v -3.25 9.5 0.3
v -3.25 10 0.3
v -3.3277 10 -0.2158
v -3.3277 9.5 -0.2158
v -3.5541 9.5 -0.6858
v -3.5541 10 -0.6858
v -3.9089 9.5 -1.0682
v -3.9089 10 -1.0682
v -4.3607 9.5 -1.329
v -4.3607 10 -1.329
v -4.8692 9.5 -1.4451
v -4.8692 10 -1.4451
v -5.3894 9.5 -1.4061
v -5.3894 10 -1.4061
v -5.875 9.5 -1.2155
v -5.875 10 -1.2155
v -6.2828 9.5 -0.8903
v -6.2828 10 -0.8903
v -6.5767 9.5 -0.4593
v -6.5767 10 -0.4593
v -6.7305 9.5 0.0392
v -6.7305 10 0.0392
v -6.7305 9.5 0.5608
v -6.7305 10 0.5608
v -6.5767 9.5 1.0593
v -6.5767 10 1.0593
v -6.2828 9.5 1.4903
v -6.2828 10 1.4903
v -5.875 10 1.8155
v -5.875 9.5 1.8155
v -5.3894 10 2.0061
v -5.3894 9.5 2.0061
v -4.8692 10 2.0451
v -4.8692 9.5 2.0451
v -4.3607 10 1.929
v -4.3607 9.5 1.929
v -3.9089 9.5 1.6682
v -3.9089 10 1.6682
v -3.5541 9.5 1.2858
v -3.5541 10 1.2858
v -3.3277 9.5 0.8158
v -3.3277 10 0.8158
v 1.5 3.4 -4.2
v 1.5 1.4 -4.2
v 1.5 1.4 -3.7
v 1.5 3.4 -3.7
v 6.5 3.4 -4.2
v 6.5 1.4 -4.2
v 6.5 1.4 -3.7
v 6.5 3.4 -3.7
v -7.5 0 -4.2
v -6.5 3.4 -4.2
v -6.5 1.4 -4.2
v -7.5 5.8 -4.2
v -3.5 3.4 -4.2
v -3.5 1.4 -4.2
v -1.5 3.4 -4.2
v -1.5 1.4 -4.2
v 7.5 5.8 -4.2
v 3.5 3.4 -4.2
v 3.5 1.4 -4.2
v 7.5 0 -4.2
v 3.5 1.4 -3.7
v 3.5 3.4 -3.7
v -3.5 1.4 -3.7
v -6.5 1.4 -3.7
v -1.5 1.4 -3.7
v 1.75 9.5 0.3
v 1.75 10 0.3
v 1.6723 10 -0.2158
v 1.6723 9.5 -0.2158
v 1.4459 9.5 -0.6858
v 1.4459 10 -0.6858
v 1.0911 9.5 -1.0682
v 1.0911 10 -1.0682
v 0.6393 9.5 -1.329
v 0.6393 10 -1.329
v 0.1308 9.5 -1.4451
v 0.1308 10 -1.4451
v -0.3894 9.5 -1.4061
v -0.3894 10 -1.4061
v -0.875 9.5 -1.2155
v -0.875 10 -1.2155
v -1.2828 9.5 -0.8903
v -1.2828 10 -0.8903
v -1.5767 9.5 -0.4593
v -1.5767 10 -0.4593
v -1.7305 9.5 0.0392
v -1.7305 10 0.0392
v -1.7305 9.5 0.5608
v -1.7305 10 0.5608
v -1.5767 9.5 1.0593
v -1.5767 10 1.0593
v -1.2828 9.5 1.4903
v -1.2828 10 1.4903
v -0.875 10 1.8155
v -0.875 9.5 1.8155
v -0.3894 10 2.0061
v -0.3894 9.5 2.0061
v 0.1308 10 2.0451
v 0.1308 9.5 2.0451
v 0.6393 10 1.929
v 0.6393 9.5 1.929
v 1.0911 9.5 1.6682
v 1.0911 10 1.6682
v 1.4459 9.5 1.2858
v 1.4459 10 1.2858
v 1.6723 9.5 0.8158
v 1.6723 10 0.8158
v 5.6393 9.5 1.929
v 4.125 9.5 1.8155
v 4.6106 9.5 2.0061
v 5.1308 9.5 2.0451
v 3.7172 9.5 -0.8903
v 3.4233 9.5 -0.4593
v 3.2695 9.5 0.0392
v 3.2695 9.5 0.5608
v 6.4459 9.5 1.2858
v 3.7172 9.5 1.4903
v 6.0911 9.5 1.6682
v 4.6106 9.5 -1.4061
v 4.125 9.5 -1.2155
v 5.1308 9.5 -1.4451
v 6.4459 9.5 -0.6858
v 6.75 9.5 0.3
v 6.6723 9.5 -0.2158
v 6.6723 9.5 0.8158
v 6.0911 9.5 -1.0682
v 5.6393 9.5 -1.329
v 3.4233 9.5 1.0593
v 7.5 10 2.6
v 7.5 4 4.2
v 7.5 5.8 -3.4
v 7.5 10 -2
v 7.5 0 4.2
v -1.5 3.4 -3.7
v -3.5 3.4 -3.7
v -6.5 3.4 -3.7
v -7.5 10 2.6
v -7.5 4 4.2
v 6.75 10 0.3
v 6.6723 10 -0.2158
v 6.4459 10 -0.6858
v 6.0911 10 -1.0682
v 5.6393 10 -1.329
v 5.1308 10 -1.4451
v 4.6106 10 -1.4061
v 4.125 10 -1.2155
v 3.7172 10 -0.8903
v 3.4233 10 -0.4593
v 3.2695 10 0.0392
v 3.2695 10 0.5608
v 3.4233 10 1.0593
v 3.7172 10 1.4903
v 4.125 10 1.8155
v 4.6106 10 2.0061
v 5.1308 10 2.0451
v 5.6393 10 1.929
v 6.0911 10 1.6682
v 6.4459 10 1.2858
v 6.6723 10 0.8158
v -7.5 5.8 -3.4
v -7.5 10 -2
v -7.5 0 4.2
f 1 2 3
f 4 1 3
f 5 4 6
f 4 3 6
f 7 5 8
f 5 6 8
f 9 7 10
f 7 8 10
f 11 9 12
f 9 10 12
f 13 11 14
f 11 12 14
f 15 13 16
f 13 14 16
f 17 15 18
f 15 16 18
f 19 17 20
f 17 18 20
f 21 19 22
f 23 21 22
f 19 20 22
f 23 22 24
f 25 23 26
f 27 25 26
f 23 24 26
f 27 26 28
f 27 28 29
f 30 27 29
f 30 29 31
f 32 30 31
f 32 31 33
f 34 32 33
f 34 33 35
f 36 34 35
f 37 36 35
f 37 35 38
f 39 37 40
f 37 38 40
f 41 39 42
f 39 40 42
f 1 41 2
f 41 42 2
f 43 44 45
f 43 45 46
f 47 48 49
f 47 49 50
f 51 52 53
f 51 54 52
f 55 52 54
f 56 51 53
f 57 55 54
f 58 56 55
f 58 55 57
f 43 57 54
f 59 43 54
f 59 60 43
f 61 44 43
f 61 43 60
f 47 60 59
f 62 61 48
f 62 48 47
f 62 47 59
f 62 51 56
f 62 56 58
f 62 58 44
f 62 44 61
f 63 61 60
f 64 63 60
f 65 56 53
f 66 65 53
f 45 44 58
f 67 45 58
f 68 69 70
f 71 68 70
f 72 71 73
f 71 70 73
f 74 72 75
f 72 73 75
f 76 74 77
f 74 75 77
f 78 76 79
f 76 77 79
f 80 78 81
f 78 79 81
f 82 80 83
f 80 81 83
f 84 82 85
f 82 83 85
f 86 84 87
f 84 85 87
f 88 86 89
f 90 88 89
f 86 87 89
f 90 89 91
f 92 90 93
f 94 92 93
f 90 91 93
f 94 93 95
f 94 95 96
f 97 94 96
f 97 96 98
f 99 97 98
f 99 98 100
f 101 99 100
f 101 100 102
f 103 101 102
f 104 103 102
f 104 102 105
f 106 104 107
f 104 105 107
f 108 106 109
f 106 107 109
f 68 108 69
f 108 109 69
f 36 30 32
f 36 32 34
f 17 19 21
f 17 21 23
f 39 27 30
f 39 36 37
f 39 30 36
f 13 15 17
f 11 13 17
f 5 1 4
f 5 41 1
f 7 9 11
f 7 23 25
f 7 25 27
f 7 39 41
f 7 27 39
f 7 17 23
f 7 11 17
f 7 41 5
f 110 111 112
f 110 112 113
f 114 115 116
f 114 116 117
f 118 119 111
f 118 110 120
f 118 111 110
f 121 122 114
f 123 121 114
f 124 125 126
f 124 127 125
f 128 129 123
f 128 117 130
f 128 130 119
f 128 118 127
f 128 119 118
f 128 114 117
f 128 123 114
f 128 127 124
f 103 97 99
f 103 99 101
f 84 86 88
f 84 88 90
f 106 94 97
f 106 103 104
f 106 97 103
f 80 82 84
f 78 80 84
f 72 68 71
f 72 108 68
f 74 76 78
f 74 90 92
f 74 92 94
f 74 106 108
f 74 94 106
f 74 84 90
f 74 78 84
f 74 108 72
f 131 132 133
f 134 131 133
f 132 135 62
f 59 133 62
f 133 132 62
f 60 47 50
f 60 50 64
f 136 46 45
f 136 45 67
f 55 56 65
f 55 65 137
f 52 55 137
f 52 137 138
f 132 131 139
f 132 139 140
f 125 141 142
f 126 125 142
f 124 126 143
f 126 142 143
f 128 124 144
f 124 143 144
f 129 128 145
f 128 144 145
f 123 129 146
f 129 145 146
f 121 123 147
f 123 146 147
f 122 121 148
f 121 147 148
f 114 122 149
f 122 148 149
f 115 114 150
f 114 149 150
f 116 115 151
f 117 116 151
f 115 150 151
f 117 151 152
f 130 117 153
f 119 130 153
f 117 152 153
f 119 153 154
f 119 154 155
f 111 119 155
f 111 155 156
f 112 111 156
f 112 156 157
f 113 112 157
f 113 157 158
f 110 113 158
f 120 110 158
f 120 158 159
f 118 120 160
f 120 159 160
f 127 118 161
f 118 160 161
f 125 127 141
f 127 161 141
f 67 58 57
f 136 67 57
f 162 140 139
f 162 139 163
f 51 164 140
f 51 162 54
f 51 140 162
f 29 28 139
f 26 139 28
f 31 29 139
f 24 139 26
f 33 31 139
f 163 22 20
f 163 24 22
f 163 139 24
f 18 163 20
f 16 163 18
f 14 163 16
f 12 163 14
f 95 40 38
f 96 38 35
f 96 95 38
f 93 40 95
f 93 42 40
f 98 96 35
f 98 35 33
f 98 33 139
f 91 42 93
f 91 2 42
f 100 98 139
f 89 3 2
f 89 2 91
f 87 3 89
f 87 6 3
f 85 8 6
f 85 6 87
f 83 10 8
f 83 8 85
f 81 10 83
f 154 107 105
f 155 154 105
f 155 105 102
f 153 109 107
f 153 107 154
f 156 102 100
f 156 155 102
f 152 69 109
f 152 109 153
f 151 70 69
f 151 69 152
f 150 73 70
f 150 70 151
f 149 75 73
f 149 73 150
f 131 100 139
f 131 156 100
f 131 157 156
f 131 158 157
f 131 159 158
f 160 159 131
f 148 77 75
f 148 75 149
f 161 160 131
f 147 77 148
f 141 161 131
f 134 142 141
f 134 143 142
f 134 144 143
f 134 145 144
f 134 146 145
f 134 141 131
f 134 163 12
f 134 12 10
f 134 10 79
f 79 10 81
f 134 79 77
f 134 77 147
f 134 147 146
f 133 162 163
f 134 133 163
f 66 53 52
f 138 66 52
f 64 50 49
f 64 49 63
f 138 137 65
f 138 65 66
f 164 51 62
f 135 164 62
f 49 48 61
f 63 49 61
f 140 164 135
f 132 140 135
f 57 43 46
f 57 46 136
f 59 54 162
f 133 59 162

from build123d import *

# Parameters (mm, degrees)
SKETCH3_W           = 15
SKETCH3_H           = 8.4
BOSS_EXTRUDE3_DEPTH = 10
CUT_EXTRUDE1_DEPTH  = 16
SKETCH5_R           = 1.75
CUT_EXTRUDE2_DEPTH  = 0.5
SKETCH6_W           = 3
SKETCH6_H           = 2
CUT_EXTRUDE4_DEPTH  = 0.5
LPATTERN2_COUNT     = 3
LPATTERN2_PITCH     = 5


with BuildPart() as part:
    # Sketch3 → Boss-Extrude3 (new body)
    with BuildSketch(Plane(origin=(0, 0, 0), x_dir=(1, 0, 0), z_dir=(0, 1, 0))):
        Rectangle(SKETCH3_W, SKETCH3_H)
    extrude(amount=BOSS_EXTRUDE3_DEPTH)

    # Sketch4 → Cut-Extrude1 (cut, through all)
    with BuildSketch(Plane.ZY.offset(7.5)):
        Polygon((-3.4, 5.8), (-2, 10), (-3.4, 10), (-4.2, 10), (-4.2, 5.8), align=None)
        Polygon((4.2, 10), (2.6, 10), (4.2, 4), align=None)
    extrude(amount=-CUT_EXTRUDE1_DEPTH, mode=Mode.SUBTRACT)

    # Sketch5 → Cut-Extrude2 (cut)
    with BuildSketch(Plane(origin=(0, 10, 0), x_dir=(1, 0, 0), z_dir=(0, 1, 0))):
        with Locations((-5, -0.3)):
            Circle(SKETCH5_R)
    cut_extrude2 = extrude(amount=-CUT_EXTRUDE2_DEPTH, mode=Mode.SUBTRACT)

    # Sketch6 → Cut-Extrude4 (cut)
    with BuildSketch(Plane(origin=(0, 0, -4.2), x_dir=(-1, 0, 0), z_dir=(0, 0, -1))):
        with Locations((5, 2.4)):
            Rectangle(SKETCH6_W, SKETCH6_H)
    cut_extrude4 = extrude(amount=-CUT_EXTRUDE4_DEPTH, mode=Mode.SUBTRACT)

    # LPattern2: Cut-Extrude2, Cut-Extrude4 ×3
    with Locations(*[(i * LPATTERN2_PITCH, 0, 0) for i in range(1, LPATTERN2_COUNT)]):
        add(cut_extrude2, mode=Mode.SUBTRACT)
        add(cut_extrude4, mode=Mode.SUBTRACT)


solid = part.part
